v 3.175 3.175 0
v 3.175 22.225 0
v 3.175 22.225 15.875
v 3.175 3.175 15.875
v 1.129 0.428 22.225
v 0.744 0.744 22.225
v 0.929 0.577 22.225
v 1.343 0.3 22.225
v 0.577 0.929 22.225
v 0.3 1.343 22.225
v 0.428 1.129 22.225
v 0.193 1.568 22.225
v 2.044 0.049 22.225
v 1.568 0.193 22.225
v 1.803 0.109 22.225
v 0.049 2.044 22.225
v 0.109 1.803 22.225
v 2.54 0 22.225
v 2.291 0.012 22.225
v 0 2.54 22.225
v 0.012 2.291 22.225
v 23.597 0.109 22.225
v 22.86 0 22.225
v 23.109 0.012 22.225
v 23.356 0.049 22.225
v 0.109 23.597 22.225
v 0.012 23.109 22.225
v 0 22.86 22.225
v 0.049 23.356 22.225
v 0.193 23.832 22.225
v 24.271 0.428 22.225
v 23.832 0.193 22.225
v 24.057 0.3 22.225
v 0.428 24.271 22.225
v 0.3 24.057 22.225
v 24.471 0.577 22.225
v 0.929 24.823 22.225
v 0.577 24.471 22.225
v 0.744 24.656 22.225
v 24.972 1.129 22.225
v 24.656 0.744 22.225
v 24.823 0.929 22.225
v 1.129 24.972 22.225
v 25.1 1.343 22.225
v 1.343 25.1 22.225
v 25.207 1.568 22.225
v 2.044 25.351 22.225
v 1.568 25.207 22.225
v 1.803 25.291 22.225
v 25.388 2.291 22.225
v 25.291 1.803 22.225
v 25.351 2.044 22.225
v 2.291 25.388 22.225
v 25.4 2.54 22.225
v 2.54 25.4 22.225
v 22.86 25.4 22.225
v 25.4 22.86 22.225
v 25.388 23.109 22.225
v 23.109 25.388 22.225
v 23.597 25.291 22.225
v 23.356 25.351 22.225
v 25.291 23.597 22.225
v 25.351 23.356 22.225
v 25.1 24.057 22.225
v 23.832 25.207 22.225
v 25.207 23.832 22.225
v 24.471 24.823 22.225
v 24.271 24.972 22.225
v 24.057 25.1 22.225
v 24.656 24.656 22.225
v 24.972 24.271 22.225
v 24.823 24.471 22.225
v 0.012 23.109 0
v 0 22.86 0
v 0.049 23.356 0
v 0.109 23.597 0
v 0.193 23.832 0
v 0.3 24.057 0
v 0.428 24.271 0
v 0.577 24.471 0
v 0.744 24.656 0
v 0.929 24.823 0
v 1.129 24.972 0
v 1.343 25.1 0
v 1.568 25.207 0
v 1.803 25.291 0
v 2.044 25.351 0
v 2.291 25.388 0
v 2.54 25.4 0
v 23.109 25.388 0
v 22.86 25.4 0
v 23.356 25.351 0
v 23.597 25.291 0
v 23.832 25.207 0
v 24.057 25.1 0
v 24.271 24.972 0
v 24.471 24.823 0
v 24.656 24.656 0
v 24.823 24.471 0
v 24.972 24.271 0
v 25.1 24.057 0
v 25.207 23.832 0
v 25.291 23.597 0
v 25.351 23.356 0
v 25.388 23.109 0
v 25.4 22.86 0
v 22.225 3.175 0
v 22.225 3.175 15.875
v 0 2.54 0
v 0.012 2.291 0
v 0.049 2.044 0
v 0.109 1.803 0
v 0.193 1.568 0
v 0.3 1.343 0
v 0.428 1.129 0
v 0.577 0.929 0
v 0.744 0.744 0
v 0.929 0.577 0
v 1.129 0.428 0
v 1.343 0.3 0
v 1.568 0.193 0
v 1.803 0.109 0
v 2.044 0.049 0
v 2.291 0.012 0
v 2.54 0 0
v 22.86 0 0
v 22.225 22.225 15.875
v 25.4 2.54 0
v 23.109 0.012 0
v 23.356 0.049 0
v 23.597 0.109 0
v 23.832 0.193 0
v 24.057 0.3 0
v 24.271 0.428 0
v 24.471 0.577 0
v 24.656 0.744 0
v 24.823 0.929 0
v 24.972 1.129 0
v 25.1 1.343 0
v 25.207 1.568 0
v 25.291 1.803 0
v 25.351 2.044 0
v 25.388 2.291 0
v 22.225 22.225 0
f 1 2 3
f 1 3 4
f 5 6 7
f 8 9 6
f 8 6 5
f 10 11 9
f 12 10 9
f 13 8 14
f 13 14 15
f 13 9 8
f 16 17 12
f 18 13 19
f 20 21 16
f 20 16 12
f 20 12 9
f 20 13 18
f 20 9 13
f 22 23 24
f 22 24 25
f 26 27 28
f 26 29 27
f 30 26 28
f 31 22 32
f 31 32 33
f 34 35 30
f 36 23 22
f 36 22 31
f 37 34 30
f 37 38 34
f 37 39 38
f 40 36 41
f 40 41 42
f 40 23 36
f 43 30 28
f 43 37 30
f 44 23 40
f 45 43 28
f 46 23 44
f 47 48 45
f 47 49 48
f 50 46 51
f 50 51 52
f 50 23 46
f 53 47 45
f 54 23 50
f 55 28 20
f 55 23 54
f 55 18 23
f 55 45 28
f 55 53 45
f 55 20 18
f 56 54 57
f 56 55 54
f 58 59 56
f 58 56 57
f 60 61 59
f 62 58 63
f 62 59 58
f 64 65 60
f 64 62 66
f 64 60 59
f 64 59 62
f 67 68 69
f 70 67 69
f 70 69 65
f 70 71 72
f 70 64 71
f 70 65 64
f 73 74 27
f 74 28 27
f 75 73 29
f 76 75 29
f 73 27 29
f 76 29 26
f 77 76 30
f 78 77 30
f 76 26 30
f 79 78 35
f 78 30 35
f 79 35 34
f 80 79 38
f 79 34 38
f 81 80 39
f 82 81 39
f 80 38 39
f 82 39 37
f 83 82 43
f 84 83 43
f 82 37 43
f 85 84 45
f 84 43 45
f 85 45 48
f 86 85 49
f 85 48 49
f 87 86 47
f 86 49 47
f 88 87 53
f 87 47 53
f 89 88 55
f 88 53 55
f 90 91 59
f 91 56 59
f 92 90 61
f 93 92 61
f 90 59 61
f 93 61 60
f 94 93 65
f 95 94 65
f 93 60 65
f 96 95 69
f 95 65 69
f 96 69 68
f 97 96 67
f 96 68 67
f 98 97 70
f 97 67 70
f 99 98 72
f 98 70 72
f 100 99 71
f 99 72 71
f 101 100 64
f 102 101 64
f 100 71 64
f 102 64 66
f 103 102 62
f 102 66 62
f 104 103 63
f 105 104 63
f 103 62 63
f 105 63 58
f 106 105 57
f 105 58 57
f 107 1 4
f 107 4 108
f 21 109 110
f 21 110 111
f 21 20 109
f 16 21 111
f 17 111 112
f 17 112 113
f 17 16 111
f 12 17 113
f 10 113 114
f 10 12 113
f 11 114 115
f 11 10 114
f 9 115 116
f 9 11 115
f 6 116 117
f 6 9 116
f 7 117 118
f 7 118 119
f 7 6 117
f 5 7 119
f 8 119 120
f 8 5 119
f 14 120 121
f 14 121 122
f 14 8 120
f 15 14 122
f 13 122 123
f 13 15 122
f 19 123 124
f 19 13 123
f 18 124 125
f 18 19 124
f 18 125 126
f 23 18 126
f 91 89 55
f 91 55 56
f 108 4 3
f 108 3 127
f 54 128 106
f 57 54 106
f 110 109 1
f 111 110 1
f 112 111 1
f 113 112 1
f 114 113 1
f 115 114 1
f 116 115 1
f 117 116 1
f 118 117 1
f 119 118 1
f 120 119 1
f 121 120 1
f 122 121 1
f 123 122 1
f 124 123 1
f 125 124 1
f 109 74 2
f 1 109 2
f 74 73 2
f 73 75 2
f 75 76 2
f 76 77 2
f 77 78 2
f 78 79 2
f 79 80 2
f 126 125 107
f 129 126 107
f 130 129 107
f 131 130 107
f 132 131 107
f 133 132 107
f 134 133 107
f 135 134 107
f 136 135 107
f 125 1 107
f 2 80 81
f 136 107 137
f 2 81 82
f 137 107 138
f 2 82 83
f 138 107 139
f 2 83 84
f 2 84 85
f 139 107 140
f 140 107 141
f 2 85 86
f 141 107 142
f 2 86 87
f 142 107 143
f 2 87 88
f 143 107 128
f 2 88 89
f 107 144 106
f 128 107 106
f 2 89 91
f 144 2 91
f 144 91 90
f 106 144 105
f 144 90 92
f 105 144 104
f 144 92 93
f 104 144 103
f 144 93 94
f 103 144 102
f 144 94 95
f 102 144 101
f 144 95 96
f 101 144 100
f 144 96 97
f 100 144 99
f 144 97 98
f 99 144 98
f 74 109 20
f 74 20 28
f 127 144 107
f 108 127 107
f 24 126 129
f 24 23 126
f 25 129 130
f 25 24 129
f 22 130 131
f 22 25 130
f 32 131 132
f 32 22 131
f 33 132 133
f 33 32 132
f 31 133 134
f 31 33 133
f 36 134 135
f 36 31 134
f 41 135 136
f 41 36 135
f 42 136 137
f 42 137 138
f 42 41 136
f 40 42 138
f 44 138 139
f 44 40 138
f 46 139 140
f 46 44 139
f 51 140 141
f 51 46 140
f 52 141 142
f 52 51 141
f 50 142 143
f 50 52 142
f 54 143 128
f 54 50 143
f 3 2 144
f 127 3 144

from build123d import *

# Parameters (mm, degrees)
F0_W     = 25.4
F0_H     = 25.4
F1_DEPTH = 22.225
F2_W     = 19.05
F2_H     = 19.05
F3_DEPTH = 15.875
F4_R     = 2.54


with BuildPart() as f1:
    # F0 (on Top) → F1 (new body)
    with BuildSketch(Plane.XY):
        with Locations((12.7, 12.7)):
            Rectangle(F0_W, F0_H)
    extrude(amount=F1_DEPTH)

    # F2 (on face) → F3 (cut)
    with BuildSketch(Plane(origin=(0, 0, 0), x_dir=(1, 0, 0), z_dir=(0, 0, -1))):
        with Locations((12.7, -12.7)):
            Rectangle(F2_W, F2_H)
    extrude(amount=-F3_DEPTH, mode=Mode.SUBTRACT)

    # F4
    f4_edges = [f1.edges().sort_by_distance(p)[0] for p in [
        (25.4, 0, 11.1125),
        (25.4, 25.4, 11.1125),
        (0, 25.4, 11.1125),
        (0, 0, 11.1125),
    ]]
    fillet(f4_edges, radius=F4_R)


solid = f1.part
